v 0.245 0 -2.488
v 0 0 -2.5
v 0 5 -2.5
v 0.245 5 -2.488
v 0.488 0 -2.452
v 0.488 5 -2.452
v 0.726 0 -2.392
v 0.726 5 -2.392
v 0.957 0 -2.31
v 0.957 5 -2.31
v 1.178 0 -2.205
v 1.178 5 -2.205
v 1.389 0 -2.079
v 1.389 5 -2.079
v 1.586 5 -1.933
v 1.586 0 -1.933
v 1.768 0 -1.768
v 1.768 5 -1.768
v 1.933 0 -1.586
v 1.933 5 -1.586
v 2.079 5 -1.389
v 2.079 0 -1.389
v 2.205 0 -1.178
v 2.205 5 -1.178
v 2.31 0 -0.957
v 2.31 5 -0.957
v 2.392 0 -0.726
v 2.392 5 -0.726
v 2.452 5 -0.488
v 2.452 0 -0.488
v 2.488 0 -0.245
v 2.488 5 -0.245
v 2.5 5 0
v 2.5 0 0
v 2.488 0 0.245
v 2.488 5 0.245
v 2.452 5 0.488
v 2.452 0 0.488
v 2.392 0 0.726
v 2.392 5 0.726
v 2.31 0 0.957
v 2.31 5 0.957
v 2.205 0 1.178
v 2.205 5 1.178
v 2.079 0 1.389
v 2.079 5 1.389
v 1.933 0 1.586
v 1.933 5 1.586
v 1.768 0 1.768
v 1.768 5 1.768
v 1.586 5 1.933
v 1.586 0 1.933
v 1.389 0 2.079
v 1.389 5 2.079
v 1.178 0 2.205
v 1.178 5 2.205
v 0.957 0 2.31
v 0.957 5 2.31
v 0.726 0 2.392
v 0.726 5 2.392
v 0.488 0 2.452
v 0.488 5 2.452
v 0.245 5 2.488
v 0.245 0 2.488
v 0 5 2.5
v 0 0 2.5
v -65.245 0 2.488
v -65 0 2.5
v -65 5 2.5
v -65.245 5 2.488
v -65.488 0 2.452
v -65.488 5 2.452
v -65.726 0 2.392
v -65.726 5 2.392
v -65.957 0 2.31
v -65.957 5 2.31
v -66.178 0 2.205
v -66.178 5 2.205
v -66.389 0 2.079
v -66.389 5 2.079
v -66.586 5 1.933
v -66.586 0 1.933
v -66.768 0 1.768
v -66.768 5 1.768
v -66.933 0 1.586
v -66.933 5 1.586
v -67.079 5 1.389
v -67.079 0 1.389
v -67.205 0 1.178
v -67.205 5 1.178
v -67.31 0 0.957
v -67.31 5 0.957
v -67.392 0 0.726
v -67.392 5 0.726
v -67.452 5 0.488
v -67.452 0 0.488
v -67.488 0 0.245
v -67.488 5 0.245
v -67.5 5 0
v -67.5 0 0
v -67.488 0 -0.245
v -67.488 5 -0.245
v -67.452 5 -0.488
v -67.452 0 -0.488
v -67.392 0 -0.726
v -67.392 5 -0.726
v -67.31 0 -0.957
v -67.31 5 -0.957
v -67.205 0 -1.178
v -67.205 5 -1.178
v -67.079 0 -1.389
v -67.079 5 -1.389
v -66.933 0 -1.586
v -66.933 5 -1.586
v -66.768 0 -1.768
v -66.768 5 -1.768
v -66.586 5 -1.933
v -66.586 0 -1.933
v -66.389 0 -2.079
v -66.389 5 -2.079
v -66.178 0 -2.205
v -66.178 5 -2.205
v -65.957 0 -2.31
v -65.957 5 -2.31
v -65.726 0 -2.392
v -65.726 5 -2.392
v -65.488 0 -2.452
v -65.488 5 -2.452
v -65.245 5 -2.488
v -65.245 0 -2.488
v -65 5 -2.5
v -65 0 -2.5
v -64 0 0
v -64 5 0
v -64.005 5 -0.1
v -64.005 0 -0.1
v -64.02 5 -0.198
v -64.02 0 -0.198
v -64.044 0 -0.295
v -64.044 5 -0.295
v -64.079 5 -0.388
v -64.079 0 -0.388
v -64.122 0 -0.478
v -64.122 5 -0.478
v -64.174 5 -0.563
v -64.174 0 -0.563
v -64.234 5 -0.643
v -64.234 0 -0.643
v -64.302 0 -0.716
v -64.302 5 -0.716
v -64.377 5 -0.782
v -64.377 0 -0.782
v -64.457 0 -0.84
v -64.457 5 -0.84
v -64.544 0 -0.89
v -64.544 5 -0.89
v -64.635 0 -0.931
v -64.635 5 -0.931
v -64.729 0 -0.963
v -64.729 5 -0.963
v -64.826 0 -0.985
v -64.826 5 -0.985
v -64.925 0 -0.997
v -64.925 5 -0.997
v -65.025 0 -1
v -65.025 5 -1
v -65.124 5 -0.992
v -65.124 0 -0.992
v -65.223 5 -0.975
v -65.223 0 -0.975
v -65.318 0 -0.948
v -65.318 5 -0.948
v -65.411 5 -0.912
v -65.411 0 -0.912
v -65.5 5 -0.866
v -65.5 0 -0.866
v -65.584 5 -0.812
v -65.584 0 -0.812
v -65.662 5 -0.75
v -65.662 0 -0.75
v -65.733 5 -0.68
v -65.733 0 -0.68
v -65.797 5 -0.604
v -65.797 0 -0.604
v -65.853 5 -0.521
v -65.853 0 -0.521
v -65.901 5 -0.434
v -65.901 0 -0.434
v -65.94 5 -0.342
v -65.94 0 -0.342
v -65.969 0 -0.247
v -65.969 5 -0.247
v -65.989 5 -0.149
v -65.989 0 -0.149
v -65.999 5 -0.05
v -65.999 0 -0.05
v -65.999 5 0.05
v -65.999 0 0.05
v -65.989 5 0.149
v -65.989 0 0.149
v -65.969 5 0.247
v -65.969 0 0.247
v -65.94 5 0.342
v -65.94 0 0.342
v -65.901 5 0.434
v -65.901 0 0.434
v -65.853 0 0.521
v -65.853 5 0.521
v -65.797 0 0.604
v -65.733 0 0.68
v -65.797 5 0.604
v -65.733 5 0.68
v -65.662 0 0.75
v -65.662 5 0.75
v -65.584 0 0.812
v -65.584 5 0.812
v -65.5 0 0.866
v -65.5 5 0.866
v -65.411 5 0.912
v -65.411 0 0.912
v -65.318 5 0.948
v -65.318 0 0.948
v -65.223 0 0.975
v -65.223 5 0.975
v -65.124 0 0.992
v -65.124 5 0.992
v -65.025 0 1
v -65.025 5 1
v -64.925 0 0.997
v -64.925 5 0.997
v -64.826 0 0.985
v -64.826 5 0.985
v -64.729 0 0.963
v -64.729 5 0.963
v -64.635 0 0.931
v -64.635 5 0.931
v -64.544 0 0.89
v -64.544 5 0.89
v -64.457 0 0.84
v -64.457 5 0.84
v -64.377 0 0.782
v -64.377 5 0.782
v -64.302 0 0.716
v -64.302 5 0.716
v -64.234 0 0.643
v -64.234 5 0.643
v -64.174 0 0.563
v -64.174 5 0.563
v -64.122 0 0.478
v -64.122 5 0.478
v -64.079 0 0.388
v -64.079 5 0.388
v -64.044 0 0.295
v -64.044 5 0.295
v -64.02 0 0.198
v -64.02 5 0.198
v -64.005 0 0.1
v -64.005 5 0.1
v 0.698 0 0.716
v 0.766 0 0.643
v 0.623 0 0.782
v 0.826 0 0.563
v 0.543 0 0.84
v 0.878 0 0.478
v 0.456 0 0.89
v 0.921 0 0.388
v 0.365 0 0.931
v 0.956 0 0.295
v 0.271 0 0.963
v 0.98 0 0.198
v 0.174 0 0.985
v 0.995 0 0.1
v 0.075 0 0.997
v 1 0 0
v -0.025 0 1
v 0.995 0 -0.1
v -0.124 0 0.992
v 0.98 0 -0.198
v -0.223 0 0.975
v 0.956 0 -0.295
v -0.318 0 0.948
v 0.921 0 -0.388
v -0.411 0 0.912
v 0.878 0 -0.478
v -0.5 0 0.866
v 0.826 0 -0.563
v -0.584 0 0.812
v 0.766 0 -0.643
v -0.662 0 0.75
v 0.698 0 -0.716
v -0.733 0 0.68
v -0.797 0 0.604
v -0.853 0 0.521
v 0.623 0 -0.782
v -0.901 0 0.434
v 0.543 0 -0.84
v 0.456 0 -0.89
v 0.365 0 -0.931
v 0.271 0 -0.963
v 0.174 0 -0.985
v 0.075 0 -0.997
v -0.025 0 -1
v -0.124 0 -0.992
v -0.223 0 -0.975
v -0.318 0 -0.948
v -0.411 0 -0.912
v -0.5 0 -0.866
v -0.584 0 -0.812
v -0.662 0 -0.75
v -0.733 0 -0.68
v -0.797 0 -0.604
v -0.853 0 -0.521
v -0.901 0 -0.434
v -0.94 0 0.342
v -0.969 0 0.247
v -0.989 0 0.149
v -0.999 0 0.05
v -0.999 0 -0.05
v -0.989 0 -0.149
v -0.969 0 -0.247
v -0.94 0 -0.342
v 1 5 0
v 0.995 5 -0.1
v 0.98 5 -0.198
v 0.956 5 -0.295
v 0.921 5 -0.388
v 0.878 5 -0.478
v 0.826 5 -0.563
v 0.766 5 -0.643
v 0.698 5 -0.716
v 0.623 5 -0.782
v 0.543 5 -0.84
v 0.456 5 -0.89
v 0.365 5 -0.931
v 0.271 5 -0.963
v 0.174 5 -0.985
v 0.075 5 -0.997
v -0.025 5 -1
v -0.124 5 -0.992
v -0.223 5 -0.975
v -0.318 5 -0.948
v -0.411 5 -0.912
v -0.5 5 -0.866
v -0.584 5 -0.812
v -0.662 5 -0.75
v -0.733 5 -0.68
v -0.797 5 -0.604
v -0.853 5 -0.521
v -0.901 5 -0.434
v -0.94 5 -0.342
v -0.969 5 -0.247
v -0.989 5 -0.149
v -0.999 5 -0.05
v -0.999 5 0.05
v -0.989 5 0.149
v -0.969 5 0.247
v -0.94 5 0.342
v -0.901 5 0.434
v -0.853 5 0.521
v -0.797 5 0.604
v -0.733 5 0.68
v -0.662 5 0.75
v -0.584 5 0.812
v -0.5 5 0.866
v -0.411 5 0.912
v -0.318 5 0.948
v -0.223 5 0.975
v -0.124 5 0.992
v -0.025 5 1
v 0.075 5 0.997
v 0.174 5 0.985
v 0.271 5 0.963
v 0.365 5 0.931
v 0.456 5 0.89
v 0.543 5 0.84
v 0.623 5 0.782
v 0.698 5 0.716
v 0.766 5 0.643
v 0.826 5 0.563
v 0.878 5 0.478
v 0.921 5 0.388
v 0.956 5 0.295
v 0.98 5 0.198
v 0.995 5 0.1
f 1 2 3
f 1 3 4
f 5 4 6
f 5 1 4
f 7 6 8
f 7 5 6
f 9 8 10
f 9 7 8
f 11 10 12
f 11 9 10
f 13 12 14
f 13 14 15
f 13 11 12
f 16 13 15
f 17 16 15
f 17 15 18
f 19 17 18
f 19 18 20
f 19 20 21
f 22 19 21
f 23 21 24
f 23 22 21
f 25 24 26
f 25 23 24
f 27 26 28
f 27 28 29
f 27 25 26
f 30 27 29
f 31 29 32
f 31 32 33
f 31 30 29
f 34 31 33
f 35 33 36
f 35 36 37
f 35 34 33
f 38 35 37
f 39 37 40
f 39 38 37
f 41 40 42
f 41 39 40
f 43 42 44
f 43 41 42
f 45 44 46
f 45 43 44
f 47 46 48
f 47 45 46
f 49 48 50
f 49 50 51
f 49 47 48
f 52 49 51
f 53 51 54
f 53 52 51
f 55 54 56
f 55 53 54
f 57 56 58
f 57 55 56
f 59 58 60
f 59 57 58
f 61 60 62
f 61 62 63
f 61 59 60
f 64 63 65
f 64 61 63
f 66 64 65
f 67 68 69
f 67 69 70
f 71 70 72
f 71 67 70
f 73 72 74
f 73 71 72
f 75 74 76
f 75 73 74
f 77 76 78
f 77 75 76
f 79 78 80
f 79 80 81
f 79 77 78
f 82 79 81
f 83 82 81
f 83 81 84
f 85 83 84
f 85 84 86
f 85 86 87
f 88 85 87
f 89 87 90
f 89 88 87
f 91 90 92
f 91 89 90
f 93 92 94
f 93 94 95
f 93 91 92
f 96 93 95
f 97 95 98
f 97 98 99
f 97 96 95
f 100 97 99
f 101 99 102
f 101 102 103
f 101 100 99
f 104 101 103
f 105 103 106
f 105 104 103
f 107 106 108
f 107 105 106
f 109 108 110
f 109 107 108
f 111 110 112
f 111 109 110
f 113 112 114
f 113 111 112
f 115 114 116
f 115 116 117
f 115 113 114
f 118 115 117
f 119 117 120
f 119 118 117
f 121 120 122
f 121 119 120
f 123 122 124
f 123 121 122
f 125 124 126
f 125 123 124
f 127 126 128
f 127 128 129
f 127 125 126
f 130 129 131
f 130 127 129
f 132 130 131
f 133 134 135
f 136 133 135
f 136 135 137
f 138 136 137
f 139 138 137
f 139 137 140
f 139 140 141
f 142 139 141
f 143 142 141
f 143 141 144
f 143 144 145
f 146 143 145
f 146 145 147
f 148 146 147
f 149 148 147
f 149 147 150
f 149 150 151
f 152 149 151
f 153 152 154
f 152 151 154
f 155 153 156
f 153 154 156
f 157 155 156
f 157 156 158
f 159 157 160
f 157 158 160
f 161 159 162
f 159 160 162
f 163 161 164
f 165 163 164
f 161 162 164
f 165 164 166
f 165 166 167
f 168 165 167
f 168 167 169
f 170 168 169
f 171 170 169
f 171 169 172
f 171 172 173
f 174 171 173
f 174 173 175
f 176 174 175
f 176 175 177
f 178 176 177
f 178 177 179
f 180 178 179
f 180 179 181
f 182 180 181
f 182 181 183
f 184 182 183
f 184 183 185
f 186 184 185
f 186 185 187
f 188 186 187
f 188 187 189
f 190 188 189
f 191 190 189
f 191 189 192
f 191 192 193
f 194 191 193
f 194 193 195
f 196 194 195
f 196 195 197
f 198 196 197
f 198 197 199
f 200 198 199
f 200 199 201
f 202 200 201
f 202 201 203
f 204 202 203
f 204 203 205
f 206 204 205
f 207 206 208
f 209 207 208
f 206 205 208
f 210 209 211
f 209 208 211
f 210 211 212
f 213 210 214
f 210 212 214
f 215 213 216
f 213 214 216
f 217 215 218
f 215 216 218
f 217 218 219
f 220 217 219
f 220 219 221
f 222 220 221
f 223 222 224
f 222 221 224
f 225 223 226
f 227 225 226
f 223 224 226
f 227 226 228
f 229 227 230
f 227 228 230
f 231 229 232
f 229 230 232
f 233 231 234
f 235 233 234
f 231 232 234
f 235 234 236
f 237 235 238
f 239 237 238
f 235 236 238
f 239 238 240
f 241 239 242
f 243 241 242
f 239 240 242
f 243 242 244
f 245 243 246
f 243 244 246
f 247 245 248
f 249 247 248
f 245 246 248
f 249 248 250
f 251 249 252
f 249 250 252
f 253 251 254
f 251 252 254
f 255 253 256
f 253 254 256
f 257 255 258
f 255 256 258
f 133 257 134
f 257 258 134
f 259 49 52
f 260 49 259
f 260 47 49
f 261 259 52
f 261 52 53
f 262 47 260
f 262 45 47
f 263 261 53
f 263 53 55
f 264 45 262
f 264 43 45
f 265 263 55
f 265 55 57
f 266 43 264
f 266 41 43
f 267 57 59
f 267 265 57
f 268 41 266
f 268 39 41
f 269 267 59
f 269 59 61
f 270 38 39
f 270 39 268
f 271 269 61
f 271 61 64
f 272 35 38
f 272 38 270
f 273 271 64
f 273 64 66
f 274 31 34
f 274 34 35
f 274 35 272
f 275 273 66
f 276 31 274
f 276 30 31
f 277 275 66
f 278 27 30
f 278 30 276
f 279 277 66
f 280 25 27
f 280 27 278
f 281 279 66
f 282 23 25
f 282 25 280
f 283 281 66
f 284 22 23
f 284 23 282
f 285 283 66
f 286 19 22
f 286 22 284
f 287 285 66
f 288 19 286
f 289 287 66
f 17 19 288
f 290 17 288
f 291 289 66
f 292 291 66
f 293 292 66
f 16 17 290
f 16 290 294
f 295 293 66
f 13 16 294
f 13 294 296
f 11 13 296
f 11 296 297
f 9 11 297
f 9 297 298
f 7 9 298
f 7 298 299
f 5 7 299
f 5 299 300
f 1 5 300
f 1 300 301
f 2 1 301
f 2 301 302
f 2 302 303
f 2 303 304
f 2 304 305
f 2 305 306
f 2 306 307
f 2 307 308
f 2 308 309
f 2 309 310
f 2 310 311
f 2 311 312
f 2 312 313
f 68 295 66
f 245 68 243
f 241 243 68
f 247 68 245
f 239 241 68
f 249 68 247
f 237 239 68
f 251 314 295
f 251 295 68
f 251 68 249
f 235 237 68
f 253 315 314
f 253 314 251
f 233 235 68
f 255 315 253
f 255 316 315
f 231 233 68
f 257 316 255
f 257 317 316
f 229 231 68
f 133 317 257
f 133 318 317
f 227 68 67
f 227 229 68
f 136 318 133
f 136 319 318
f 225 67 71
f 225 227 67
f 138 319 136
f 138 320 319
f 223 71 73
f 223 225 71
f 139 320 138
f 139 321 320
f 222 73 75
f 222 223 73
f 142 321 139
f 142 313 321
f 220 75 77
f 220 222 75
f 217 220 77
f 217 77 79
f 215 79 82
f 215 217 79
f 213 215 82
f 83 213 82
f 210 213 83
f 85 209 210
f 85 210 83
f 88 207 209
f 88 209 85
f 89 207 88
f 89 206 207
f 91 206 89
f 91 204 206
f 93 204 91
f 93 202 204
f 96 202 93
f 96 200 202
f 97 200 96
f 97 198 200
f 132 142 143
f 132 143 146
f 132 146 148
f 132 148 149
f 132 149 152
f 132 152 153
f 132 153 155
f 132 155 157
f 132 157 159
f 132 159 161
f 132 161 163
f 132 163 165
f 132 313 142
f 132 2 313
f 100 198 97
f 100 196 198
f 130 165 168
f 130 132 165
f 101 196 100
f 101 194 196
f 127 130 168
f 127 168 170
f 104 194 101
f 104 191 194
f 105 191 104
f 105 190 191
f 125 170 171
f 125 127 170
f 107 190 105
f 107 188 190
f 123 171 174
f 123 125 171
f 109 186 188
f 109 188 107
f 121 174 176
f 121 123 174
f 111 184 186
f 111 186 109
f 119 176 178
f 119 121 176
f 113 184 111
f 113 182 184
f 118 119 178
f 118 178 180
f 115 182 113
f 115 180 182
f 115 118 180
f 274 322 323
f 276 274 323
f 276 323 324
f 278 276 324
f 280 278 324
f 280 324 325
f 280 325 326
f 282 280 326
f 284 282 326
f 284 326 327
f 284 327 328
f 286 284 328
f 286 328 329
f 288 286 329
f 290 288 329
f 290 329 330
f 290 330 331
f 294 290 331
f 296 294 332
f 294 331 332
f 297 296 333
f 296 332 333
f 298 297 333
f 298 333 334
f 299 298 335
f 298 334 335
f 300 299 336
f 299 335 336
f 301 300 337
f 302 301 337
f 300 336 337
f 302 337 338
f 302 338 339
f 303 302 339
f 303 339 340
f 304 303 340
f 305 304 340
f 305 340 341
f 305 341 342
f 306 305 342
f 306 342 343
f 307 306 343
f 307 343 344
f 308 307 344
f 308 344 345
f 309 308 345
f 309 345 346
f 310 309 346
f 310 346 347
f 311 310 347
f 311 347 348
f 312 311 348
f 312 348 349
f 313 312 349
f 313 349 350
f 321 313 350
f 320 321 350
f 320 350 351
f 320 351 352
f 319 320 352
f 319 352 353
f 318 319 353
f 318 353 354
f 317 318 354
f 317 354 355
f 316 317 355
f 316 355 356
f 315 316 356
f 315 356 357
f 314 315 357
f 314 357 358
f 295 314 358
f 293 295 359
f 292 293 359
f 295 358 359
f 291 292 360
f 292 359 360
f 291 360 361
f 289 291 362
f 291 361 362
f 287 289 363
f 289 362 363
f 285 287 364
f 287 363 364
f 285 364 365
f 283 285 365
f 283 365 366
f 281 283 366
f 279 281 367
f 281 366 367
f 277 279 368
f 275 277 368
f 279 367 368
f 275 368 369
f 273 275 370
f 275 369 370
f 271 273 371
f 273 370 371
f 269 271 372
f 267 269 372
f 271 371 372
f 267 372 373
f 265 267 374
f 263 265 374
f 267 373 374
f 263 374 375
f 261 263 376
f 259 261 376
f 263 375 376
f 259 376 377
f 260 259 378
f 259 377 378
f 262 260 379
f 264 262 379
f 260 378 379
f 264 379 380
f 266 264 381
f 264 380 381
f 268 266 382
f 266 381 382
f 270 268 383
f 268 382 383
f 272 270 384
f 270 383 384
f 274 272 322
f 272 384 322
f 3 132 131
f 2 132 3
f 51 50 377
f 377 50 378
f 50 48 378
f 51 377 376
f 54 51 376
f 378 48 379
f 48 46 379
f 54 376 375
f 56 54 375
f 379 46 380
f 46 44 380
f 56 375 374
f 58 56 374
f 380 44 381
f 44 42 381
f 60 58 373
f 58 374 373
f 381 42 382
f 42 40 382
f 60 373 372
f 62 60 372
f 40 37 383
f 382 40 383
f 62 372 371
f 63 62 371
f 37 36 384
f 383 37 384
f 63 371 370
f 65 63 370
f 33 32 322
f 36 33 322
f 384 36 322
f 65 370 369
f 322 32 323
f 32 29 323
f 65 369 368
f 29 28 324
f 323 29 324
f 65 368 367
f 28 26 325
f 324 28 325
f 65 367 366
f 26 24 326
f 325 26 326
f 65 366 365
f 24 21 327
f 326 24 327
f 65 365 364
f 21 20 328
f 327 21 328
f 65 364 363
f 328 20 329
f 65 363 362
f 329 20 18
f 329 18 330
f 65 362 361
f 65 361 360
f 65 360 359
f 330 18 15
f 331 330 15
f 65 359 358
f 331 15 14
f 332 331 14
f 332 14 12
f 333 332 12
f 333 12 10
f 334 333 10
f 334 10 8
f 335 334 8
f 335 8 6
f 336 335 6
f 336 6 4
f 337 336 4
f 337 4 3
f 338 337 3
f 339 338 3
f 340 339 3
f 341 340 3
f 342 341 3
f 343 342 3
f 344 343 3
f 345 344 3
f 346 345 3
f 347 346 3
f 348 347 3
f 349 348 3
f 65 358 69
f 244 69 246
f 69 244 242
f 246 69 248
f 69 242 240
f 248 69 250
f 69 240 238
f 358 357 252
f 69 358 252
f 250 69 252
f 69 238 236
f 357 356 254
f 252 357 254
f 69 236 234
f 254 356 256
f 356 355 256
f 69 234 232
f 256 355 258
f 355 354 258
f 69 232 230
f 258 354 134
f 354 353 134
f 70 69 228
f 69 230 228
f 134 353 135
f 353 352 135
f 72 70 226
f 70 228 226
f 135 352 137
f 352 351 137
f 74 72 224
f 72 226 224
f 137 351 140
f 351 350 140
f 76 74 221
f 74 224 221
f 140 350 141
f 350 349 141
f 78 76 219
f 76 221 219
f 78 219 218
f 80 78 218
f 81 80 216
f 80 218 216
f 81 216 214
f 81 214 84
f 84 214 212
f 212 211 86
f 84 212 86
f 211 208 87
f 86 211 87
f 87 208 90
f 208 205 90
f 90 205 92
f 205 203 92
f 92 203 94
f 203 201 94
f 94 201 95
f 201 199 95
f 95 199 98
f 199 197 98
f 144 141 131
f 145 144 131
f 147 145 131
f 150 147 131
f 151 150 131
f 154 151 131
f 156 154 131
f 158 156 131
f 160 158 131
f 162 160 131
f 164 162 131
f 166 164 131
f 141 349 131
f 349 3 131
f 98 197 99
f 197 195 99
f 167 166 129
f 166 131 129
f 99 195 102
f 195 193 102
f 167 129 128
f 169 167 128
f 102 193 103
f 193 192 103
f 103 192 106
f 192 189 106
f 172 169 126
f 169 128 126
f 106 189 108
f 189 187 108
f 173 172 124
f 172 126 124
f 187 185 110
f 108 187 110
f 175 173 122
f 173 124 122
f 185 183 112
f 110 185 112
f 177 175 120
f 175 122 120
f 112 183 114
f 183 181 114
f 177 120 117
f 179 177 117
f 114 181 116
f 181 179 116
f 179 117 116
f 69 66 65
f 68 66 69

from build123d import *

# Parameters (mm, degrees)
BOSS_EXTRUDE1_DEPTH = 5
CUT_EXTRUDE1_REACH  = 7
SKETCH2_R           = 1


with BuildPart() as part:
    # Sketch1 → Boss-Extrude1 (new body)
    with BuildSketch(Plane(origin=(0, 0, 0), x_dir=(1, 0, 0), z_dir=(0, 1, 0))):
        with BuildLine():
            Line((0, -2.5), (-65, -2.5))
            ThreePointArc((-65, -2.5), (-67.5, 0), (-65, 2.5))
            Line((-65, 2.5), (0, 2.5))
            ThreePointArc((0, 2.5), (2.5, 0), (0, -2.5))
        make_face()
    extrude(amount=BOSS_EXTRUDE1_DEPTH)

    # Sketch2 → Cut-Extrude1 (cut, up to next)
    with BuildSketch(Plane(origin=(0, 5, 0), x_dir=(1, 0, 0), z_dir=(0, 1, 0)), mode=Mode.PRIVATE) as cut_extrude1_sk1:
        with Locations((-65, 0)):
            Circle(SKETCH2_R)
    cut_extrude1_tool1 = extrude(cut_extrude1_sk1.sketch, amount=-CUT_EXTRUDE1_REACH, mode=Mode.PRIVATE) & part.part
    add(cut_extrude1_tool1.solids().sort_by_distance((-65, 5, 0))[0], mode=Mode.SUBTRACT)
    # Sketch2 → Cut-Extrude1 (cut, up to next)
    with BuildSketch(Plane(origin=(0, 5, 0), x_dir=(1, 0, 0), z_dir=(0, 1, 0)), mode=Mode.PRIVATE) as cut_extrude1_sk2:
        Circle(SKETCH2_R)
    cut_extrude1_tool2 = extrude(cut_extrude1_sk2.sketch, amount=-CUT_EXTRUDE1_REACH, mode=Mode.PRIVATE) & part.part
    add(cut_extrude1_tool2.solids().sort_by_distance((0, 5, 0))[0], mode=Mode.SUBTRACT)


solid = part.part
